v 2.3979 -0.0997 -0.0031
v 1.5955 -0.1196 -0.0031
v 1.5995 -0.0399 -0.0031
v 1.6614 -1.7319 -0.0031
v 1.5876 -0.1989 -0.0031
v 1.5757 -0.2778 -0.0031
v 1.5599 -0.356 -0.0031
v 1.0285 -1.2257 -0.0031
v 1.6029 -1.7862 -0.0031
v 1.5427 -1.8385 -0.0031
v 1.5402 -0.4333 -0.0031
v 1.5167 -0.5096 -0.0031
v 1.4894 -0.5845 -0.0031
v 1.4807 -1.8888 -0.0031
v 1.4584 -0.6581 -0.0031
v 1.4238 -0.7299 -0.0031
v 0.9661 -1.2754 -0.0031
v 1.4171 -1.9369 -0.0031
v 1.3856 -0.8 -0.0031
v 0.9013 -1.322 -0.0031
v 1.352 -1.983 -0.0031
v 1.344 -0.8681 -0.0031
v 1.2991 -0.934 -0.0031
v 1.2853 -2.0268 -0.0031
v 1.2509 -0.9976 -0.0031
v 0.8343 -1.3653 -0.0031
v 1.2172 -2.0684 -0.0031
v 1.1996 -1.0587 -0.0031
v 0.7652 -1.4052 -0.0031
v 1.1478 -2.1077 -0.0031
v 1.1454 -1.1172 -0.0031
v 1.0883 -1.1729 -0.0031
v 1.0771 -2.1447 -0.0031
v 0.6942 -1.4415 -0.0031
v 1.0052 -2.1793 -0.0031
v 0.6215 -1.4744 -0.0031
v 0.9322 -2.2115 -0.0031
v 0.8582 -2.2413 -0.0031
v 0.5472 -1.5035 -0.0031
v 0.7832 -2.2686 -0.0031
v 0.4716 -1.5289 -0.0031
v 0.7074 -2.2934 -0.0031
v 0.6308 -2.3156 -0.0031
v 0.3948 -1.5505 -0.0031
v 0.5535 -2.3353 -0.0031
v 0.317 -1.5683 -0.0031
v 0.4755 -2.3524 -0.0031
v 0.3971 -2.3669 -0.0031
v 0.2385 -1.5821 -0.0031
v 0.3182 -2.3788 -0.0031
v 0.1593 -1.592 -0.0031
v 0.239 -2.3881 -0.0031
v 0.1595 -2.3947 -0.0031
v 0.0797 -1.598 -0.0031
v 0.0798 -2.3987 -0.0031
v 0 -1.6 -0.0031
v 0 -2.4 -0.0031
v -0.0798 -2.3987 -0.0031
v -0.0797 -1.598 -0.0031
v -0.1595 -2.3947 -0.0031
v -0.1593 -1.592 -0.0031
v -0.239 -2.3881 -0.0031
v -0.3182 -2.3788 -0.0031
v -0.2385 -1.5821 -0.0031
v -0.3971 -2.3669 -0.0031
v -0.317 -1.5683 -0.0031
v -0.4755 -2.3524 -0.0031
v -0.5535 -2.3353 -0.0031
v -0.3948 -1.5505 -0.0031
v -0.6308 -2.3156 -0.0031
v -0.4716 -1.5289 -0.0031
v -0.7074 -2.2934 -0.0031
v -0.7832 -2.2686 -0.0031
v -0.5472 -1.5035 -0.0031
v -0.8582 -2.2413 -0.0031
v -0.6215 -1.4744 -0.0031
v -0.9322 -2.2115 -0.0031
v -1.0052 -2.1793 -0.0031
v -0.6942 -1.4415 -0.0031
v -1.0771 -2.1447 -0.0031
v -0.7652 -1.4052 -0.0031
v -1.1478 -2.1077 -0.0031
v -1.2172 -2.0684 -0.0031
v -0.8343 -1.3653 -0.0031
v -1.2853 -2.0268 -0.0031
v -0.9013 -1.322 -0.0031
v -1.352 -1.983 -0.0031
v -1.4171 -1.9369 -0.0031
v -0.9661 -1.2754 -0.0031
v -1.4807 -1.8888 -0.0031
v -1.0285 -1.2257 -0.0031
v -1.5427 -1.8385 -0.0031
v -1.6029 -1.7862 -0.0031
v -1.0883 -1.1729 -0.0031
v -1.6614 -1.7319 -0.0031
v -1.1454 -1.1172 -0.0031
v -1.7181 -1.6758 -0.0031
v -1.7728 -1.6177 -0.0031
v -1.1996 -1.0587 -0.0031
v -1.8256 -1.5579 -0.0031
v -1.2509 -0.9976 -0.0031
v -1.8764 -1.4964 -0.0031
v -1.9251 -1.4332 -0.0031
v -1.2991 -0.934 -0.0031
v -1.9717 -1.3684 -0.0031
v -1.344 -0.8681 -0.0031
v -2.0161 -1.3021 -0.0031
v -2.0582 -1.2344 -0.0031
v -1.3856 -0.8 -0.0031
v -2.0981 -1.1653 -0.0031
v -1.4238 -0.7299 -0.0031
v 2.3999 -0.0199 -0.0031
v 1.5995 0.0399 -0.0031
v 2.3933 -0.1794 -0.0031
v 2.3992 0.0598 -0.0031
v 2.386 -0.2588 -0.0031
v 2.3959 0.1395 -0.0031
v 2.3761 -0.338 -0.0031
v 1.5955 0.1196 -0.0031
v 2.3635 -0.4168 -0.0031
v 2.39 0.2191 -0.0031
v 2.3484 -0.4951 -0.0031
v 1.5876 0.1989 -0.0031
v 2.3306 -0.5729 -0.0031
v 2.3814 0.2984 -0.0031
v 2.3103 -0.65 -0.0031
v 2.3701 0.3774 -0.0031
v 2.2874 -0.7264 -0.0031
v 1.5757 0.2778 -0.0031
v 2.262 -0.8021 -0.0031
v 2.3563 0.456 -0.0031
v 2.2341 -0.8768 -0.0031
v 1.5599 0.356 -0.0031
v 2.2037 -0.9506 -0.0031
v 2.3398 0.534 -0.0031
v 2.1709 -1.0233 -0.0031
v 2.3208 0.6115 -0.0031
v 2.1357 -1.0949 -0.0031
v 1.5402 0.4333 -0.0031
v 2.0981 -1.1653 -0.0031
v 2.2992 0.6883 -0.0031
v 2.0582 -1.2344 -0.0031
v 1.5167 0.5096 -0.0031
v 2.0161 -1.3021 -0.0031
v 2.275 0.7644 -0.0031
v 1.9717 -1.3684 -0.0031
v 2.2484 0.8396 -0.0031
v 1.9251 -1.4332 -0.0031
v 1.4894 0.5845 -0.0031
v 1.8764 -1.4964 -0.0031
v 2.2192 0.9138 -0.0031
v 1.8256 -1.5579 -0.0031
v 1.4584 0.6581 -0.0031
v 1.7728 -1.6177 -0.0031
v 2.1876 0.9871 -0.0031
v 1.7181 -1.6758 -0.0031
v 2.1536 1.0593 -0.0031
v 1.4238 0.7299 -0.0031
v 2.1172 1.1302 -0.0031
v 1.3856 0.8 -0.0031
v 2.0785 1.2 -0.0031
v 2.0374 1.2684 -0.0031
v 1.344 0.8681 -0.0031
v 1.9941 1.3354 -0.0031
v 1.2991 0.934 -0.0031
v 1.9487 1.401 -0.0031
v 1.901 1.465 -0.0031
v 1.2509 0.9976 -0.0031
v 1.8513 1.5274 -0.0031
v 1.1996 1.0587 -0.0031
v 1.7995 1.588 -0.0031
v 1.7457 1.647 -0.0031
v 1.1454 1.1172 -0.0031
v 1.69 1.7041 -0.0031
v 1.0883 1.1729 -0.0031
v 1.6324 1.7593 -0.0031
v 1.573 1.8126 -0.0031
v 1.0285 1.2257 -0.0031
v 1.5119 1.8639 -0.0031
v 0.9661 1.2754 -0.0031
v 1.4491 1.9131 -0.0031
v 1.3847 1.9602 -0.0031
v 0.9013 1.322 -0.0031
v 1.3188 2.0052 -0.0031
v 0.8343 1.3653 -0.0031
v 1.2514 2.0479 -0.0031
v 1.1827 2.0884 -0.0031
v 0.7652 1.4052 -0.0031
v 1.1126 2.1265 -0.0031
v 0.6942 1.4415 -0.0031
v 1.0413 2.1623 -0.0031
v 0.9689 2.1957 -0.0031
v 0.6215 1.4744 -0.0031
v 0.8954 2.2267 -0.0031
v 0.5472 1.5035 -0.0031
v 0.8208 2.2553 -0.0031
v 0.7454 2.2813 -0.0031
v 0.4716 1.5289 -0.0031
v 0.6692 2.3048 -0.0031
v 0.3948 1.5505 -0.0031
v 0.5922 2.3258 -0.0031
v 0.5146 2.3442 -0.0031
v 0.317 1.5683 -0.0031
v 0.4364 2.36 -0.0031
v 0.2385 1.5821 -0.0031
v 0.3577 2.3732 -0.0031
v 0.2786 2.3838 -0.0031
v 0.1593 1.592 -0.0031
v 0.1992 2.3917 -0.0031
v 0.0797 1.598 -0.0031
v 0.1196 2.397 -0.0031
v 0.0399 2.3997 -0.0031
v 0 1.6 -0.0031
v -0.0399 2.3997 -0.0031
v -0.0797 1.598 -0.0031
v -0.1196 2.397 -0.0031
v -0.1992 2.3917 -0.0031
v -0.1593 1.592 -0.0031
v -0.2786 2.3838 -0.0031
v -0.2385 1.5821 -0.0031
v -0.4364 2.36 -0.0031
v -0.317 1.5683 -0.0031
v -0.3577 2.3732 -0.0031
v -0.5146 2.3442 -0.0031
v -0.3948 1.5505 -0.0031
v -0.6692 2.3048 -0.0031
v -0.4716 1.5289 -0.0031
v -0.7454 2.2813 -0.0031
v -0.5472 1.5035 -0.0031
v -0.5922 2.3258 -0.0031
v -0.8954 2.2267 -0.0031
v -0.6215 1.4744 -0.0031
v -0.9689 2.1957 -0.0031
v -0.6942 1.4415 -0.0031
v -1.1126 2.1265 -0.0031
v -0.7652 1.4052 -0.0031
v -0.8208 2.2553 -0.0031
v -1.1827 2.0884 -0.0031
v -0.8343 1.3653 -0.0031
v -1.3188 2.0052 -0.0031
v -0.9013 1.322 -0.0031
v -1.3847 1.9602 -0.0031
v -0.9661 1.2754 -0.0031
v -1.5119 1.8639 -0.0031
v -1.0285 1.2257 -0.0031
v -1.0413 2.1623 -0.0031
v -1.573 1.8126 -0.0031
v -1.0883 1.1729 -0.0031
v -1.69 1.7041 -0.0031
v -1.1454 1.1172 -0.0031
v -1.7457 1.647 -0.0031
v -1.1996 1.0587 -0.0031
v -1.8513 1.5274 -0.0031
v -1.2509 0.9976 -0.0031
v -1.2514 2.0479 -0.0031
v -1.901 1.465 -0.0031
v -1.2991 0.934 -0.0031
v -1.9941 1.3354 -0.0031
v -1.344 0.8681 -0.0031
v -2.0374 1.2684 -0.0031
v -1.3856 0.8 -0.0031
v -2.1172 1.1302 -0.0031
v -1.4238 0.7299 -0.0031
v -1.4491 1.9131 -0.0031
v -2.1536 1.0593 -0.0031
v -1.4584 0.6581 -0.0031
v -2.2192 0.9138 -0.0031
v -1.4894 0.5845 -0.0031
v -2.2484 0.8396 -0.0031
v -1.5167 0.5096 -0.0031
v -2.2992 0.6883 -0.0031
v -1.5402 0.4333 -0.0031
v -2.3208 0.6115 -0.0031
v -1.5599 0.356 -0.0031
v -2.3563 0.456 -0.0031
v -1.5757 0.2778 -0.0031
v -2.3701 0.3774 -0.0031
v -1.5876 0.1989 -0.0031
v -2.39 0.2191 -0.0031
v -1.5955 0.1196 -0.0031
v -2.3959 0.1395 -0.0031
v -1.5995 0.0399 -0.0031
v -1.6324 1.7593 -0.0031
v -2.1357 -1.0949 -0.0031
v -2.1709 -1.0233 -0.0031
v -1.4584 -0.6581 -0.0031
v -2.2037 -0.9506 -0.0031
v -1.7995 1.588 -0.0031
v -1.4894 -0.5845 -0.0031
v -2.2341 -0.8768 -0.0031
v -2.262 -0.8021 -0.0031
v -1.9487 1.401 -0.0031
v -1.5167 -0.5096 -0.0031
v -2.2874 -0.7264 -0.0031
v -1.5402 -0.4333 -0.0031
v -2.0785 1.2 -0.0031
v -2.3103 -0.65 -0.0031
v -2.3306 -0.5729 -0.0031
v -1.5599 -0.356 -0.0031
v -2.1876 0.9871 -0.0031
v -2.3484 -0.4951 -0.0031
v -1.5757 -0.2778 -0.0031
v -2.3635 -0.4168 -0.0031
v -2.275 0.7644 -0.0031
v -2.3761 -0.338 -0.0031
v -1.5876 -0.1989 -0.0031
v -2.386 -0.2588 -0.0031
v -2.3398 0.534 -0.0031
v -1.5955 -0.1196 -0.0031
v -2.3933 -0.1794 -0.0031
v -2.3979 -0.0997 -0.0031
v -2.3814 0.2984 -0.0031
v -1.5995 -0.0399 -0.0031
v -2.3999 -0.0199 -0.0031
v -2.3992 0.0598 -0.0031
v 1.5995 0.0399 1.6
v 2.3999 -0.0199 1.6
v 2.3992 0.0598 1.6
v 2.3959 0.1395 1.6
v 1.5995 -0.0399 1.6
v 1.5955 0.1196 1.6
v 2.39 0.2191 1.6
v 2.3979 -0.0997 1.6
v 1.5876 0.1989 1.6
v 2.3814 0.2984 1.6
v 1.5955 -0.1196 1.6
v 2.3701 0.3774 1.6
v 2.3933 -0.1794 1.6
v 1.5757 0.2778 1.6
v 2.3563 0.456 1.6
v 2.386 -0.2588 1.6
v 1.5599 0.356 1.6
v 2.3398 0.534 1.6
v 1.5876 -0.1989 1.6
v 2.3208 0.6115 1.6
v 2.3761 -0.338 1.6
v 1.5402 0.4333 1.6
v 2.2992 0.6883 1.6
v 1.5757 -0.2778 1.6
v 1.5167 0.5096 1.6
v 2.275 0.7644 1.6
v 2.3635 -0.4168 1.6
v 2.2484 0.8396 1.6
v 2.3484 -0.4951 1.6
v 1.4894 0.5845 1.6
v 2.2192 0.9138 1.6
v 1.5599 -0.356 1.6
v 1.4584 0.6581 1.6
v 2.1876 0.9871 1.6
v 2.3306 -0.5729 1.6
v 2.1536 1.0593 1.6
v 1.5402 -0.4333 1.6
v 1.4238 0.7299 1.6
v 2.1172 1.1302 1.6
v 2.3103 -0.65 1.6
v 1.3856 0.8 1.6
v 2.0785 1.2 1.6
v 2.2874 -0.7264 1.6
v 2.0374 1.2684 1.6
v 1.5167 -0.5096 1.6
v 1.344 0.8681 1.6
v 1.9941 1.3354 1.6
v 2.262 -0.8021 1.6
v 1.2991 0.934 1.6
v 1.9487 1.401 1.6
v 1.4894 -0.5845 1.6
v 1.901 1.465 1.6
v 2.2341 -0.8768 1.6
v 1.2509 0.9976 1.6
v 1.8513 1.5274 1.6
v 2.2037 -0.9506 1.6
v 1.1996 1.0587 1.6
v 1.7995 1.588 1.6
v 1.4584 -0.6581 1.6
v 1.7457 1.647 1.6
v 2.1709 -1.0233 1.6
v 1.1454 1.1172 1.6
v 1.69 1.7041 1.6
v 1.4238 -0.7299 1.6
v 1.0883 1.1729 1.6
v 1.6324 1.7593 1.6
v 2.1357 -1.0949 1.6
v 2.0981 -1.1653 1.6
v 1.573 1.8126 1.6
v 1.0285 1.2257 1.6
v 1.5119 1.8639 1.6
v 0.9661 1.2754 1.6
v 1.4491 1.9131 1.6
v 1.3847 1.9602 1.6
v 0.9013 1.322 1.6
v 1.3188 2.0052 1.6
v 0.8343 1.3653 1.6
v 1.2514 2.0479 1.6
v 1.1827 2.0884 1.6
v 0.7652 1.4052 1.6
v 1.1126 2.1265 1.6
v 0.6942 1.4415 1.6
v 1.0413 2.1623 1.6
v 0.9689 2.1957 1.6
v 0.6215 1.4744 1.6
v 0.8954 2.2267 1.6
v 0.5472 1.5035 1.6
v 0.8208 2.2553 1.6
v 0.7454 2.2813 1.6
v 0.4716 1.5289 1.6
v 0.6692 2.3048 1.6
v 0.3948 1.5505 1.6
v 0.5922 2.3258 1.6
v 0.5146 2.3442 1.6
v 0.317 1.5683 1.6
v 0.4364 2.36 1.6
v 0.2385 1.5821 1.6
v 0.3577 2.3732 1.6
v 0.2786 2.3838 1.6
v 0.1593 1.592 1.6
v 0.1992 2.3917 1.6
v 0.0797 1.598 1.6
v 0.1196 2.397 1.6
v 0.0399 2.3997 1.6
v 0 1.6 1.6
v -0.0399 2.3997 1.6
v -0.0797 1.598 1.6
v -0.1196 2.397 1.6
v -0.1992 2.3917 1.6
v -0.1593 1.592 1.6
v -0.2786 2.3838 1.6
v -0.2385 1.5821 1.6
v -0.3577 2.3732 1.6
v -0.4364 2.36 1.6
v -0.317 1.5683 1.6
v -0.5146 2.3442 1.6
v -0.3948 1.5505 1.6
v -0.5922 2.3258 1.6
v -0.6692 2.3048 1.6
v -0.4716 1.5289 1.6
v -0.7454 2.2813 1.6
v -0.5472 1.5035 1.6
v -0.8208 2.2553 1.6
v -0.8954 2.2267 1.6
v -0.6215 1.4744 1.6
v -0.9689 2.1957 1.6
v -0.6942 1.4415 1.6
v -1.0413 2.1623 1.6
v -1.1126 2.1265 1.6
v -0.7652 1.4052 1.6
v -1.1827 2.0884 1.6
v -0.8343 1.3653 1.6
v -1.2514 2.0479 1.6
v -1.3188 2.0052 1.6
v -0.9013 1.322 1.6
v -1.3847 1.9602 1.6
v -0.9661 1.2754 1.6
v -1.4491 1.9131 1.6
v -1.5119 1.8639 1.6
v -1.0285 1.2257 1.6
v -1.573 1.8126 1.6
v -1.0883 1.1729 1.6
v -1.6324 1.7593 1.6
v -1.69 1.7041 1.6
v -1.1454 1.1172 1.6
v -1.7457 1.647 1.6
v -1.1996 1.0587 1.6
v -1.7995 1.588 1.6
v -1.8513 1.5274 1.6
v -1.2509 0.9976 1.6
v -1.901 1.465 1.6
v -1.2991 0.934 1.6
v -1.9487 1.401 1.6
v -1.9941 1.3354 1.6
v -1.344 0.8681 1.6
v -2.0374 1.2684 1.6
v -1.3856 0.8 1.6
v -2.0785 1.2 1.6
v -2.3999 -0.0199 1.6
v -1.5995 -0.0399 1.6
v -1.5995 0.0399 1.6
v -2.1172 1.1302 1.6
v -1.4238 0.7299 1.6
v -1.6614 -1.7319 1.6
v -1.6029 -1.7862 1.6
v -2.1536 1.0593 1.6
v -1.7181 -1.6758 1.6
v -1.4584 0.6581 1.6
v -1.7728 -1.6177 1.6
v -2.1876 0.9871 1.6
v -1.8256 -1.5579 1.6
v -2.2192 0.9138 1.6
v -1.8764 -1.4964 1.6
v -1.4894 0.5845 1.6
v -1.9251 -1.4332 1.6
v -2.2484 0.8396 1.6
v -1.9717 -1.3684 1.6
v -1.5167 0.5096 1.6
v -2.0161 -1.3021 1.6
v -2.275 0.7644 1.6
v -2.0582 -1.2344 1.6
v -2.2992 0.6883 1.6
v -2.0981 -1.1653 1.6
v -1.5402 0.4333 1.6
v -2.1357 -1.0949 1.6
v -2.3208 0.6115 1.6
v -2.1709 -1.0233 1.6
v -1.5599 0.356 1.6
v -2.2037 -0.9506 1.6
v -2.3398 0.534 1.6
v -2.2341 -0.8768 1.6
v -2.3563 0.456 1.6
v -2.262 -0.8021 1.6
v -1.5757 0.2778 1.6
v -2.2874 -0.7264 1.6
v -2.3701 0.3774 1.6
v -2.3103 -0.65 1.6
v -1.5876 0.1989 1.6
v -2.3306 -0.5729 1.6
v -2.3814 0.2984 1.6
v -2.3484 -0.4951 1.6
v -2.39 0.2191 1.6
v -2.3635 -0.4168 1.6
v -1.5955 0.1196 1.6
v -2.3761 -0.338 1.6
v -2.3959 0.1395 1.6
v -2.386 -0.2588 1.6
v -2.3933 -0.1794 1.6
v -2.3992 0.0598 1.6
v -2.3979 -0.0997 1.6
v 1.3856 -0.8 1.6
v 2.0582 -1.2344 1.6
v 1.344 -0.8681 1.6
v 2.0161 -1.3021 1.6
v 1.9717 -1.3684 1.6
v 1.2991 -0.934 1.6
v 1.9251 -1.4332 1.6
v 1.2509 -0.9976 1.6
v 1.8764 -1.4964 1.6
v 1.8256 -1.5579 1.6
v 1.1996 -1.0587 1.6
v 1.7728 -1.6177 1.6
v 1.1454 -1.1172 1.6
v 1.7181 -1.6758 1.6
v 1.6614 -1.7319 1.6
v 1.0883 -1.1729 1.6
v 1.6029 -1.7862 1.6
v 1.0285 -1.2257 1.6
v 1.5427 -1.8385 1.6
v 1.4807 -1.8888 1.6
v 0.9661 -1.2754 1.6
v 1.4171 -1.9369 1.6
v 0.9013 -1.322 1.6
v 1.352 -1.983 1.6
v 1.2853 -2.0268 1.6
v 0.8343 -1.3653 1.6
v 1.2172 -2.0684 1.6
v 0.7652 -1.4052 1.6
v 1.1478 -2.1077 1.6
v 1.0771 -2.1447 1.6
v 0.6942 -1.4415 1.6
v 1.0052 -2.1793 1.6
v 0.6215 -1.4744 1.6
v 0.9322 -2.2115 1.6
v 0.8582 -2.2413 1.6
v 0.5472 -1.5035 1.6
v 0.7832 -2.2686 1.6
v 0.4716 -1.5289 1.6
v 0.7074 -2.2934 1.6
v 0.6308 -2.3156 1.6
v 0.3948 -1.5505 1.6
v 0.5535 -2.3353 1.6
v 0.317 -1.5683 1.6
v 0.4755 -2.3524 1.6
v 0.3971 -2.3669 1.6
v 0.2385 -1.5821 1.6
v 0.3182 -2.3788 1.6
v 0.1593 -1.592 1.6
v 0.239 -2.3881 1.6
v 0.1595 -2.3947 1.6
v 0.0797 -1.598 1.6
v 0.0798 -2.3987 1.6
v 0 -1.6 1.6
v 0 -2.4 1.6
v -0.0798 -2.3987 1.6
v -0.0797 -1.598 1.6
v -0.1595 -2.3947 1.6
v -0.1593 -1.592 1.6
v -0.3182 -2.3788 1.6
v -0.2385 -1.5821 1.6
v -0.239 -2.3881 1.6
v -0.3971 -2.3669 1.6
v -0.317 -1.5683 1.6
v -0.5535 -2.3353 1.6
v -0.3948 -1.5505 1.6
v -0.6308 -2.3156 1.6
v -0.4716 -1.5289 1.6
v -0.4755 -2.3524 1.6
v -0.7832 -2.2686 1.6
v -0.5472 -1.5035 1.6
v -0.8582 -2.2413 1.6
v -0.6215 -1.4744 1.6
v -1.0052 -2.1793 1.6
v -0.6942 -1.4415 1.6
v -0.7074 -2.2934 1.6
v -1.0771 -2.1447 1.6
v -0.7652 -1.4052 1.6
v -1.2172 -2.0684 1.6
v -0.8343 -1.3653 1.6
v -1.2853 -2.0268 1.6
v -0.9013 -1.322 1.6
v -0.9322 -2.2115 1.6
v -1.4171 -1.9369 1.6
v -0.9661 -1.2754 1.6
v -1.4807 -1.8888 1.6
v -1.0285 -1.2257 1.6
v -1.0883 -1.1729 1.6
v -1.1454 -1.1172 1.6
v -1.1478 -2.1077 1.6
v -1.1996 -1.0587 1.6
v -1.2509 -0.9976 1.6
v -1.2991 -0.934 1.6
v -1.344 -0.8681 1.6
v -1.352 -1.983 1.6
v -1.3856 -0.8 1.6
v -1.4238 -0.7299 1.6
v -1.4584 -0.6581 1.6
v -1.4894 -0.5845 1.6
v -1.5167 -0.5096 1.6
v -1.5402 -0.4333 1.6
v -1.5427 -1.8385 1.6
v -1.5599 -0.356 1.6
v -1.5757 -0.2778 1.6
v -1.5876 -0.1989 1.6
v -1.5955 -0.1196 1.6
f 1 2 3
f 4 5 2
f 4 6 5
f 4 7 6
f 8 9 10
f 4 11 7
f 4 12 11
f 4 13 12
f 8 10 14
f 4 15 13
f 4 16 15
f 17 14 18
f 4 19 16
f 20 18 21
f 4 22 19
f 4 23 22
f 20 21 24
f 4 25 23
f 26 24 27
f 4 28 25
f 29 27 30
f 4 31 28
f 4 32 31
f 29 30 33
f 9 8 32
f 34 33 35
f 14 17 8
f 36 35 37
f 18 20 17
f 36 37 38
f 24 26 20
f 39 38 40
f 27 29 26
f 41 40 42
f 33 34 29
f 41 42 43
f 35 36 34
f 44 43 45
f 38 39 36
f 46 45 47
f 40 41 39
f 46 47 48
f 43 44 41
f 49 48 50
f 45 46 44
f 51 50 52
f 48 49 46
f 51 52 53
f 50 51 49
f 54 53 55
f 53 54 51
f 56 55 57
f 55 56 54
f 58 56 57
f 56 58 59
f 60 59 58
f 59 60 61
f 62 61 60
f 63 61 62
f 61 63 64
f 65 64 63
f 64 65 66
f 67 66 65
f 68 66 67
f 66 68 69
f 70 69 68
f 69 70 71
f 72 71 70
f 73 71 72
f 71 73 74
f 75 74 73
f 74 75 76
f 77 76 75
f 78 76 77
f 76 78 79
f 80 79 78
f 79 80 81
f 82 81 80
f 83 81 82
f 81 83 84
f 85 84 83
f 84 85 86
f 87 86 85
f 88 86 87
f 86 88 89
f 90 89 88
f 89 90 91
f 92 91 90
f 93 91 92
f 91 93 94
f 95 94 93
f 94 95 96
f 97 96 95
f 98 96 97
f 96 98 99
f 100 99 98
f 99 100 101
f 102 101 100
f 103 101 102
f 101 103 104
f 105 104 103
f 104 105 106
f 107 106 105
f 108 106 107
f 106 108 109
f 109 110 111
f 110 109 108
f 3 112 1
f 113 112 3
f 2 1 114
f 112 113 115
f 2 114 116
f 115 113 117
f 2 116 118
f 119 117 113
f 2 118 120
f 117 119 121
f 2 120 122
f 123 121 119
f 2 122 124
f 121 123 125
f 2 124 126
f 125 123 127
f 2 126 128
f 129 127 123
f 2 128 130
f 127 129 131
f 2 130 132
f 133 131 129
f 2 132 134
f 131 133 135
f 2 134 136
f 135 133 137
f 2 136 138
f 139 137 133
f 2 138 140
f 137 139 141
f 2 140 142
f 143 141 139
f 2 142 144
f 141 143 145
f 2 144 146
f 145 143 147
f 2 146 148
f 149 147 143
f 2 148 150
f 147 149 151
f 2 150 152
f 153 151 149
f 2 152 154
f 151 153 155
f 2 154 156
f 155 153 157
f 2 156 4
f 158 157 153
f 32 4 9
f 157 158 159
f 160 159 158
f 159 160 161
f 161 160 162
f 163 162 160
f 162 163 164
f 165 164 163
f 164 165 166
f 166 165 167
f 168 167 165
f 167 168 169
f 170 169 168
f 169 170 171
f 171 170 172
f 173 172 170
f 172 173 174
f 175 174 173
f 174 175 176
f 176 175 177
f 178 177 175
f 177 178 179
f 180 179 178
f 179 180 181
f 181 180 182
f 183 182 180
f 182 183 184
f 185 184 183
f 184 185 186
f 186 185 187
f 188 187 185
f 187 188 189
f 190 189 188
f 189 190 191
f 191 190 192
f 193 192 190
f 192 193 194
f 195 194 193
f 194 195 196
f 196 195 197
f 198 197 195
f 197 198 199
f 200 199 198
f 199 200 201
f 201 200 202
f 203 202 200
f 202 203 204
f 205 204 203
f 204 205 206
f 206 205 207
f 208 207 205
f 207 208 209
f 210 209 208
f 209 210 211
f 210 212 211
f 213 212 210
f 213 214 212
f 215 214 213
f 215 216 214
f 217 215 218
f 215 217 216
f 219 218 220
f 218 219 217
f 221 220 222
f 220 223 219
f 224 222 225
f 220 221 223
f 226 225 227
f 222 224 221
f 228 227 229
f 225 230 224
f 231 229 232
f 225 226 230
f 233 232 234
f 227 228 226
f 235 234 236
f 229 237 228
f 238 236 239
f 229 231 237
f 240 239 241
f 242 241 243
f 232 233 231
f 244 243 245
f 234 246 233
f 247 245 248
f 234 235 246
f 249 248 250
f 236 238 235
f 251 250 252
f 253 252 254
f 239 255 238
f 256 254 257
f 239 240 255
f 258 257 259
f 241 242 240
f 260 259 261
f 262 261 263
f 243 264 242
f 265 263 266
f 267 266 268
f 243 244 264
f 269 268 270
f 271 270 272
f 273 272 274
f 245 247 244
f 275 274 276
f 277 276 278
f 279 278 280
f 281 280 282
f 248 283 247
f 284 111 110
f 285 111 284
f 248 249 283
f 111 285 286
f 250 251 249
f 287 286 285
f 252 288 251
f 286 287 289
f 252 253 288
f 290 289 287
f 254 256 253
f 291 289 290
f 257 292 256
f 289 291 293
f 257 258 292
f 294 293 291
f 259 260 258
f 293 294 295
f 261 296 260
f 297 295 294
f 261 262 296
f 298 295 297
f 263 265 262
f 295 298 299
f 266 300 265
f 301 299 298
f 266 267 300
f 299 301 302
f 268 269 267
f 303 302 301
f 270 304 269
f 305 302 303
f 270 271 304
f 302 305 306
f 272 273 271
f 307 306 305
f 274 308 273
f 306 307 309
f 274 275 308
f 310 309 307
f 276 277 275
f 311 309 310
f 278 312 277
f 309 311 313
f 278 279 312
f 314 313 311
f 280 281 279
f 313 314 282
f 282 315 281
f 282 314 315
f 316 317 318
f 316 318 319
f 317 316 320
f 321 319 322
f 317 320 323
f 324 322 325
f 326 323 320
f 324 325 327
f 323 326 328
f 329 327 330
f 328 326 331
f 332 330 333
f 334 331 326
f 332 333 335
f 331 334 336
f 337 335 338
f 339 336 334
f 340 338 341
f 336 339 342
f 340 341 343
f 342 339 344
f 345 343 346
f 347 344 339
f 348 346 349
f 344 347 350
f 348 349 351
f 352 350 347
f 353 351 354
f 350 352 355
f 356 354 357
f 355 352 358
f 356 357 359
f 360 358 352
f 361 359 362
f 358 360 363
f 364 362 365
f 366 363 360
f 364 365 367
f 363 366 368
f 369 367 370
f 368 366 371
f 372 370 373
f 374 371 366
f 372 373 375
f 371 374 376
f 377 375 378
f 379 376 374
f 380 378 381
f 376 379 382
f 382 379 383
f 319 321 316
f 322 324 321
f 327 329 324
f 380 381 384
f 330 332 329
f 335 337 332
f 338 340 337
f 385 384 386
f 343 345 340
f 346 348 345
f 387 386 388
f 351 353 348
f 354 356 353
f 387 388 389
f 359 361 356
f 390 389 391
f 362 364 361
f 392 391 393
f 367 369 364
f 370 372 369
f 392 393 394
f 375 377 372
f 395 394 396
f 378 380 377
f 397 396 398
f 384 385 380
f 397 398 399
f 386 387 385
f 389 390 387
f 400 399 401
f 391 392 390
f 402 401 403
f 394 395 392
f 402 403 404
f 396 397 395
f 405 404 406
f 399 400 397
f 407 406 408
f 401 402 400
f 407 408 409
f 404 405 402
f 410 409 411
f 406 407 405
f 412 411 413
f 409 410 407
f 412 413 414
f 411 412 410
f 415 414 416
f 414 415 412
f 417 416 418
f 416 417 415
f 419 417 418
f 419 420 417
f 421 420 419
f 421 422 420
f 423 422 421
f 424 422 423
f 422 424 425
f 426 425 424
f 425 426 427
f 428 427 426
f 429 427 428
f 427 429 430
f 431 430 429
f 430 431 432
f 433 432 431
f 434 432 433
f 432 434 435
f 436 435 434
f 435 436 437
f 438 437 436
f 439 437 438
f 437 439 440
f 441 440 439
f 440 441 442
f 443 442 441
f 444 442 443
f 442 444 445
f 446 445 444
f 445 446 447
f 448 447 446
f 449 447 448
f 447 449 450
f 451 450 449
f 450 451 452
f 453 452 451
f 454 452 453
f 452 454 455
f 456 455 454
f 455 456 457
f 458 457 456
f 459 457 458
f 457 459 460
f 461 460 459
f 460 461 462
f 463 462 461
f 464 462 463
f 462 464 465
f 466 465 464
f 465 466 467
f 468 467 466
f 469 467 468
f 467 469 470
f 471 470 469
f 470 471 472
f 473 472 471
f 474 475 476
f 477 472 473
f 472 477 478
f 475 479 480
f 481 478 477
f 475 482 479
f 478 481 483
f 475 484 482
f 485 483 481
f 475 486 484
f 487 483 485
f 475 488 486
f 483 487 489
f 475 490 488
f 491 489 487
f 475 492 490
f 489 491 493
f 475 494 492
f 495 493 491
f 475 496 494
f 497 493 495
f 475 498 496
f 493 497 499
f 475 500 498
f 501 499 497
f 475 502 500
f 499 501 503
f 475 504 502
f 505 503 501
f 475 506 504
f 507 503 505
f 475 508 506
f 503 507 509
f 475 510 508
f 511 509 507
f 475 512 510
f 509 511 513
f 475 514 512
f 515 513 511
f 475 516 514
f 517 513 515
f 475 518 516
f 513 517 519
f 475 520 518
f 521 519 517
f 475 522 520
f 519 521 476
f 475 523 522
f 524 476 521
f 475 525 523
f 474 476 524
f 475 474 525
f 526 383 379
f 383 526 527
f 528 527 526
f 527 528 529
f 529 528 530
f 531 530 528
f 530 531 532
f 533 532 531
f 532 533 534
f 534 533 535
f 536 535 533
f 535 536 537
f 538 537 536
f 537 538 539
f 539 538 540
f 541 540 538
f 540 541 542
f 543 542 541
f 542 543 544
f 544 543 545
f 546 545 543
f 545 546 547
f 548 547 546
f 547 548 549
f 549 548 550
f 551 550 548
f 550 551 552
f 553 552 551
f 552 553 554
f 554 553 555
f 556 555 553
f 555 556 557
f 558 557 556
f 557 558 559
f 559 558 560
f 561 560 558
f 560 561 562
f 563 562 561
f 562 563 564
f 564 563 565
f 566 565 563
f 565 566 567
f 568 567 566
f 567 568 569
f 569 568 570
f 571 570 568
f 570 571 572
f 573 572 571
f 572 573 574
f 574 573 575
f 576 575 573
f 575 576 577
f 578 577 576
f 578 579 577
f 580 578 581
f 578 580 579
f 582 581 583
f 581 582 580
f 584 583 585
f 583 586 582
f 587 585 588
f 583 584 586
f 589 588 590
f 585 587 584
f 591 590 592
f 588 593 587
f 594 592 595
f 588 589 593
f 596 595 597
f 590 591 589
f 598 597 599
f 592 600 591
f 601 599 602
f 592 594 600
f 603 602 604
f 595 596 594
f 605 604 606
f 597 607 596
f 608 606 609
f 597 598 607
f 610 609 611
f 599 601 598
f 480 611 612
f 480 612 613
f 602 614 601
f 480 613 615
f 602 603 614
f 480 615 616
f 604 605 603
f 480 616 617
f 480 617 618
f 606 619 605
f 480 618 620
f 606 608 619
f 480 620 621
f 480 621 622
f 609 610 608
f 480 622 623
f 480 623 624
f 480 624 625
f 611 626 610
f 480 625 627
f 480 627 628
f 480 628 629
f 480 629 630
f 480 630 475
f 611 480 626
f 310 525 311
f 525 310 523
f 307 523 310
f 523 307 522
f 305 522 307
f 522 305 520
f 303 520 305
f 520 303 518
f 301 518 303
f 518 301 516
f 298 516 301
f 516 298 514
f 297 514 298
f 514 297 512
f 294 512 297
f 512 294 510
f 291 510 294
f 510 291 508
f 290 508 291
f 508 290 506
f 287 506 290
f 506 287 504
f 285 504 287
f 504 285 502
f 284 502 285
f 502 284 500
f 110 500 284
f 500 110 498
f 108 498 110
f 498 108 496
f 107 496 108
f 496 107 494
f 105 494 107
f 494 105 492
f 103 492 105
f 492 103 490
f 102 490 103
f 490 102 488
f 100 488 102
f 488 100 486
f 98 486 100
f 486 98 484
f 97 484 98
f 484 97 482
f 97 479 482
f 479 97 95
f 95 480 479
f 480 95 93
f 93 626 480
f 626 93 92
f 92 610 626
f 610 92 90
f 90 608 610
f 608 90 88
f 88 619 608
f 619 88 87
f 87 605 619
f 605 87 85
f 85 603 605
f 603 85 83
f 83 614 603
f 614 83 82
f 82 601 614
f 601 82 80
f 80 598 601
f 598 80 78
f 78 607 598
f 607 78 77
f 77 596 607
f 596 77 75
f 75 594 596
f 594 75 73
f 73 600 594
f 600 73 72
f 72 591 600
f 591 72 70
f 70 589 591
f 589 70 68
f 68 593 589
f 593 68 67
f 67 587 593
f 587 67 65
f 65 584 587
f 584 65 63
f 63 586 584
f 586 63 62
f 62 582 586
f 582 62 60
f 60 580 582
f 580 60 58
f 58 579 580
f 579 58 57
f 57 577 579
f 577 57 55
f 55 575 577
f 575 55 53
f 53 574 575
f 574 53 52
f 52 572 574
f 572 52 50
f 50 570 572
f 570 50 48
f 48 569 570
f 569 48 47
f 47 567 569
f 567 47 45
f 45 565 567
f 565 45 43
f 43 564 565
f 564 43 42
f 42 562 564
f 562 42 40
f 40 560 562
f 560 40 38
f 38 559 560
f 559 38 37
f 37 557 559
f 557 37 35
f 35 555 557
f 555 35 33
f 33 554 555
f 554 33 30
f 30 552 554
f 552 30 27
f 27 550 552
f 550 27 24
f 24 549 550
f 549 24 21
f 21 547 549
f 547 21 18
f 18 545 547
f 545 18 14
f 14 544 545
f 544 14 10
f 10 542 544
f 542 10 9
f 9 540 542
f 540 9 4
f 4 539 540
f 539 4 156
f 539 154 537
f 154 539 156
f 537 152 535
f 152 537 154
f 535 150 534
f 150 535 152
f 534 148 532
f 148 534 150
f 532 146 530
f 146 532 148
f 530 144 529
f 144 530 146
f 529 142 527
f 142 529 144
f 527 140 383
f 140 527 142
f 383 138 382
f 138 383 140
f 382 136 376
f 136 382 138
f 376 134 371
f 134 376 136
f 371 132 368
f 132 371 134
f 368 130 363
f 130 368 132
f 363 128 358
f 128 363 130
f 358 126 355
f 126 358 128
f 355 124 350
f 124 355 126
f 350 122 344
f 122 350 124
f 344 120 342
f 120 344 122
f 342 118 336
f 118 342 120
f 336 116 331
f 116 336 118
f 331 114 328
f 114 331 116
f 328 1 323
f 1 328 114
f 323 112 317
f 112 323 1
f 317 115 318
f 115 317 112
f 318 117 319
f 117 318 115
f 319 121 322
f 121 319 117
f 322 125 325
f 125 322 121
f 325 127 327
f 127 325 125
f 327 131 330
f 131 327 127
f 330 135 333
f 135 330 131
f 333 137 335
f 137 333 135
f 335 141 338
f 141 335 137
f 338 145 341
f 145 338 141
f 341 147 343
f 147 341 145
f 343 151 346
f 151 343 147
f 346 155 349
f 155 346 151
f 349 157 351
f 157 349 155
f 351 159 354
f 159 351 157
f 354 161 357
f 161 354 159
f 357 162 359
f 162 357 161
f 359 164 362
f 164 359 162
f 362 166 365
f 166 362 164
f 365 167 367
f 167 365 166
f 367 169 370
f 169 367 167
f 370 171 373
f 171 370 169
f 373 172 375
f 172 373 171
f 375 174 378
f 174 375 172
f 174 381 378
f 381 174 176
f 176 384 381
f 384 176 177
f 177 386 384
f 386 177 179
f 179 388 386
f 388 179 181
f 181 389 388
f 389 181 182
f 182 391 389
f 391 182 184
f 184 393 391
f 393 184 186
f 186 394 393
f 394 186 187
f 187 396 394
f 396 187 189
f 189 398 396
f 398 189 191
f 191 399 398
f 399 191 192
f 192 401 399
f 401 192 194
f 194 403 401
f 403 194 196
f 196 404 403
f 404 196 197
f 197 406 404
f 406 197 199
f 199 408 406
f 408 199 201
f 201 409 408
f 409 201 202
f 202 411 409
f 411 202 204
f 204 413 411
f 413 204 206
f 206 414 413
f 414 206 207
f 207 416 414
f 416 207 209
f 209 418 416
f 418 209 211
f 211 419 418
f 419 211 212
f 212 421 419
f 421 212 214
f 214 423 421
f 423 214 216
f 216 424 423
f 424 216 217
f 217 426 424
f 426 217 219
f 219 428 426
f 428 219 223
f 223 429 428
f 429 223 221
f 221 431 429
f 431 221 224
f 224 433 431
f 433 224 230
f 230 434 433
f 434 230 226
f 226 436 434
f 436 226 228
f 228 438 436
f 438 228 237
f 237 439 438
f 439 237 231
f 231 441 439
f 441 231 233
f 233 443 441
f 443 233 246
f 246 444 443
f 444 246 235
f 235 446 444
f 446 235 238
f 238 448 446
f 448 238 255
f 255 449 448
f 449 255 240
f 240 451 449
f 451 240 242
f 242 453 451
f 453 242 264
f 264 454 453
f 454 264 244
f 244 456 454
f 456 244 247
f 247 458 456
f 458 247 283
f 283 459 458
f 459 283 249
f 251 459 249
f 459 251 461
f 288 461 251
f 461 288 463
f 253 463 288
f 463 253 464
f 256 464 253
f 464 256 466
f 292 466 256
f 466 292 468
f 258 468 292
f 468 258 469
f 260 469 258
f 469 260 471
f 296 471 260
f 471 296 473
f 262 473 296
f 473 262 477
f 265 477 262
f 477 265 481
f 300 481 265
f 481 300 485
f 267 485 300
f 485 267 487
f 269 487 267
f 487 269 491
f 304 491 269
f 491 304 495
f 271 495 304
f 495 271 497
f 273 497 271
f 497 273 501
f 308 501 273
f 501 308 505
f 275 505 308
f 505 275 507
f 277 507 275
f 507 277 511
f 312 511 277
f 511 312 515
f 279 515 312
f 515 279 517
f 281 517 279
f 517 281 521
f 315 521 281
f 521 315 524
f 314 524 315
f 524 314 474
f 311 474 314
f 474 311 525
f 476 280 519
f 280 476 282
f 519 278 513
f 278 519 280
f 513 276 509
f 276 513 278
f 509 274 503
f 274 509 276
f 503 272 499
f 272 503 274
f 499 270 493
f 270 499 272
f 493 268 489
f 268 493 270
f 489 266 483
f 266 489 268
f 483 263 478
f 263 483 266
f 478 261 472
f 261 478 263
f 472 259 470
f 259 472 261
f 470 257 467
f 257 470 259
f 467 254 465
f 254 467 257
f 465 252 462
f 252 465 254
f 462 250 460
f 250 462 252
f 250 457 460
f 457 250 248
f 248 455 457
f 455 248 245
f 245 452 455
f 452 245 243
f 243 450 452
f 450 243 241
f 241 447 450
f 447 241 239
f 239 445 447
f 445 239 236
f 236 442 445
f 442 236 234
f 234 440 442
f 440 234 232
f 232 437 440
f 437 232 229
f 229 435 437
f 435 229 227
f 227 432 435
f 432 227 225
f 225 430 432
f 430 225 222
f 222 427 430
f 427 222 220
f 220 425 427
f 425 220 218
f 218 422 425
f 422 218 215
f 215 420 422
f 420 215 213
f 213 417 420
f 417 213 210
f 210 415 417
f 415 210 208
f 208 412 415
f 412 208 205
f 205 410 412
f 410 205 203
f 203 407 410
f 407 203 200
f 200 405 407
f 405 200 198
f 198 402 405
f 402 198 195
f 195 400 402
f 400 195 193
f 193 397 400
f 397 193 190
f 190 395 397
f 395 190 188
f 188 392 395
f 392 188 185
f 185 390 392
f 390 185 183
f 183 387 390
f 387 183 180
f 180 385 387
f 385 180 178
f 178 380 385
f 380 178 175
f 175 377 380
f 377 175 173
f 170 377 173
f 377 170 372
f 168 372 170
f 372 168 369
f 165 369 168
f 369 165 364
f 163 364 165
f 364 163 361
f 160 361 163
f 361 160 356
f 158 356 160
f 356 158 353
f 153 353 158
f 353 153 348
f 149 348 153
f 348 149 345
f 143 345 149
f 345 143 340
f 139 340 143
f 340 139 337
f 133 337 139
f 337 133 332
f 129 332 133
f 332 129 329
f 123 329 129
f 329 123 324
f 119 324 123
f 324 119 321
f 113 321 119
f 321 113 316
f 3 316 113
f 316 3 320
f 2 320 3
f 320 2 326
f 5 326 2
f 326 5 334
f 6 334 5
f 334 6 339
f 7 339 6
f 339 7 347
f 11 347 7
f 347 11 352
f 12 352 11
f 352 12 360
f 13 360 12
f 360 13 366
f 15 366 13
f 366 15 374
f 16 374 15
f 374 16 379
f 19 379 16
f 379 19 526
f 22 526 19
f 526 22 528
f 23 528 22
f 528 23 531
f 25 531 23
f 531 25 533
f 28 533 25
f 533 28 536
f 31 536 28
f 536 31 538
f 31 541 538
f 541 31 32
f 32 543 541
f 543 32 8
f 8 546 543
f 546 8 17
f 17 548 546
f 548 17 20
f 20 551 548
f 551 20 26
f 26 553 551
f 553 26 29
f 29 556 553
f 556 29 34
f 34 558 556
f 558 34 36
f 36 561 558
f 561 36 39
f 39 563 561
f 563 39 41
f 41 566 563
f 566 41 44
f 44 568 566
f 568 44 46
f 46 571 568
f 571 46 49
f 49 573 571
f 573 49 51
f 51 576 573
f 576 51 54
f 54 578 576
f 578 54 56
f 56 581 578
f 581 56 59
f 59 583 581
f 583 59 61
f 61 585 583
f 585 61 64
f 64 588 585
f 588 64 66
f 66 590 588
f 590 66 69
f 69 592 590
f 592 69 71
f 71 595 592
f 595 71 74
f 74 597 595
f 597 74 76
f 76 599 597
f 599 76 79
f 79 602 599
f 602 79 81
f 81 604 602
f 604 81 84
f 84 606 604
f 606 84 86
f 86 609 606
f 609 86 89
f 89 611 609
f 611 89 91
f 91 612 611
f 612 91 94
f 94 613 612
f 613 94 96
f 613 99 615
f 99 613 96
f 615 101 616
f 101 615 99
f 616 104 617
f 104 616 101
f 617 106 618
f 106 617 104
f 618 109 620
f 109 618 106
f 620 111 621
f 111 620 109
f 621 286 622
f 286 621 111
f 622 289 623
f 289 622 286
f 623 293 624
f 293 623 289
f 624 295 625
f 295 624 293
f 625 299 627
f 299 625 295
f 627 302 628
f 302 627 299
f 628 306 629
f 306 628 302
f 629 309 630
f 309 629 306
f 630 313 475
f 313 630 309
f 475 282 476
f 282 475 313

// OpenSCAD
use <../lib.scad>
use <s/4181s01.scad>
use <s/4181s02.scad>
use <../p/stud2.scad>
$fa=1; $fs=0.2;
function ldraw_lib__4181p03(realsolid=false) = [
// 0 Train Door  1 x  4 x  5 Left with White Stripe Pattern
// 0 Name: 4181p03.dat
// 0 Author: James Jessiman
// 0 !LDRAW_ORG Part UPDATE 2009-02
// 0 !LICENSE Licensed under CC BY 2.0 and CC BY 4.0 : see CAreadme.txt
// 
// 0 BFC CERTIFY CCW
  [0,"BFC","CERTIFY"],
  [0,"BFC","CCW"],
// 
// 0 !HISTORY 2007-07-04 [PTadmin] Header formatted for Contributor Agreement
// 0 !HISTORY 2008-07-01 [PTadmin] Official Update 2008-01
// 0 !HISTORY 2008-07-07 [WilliamH] BFCed; sub-parted (2006-09-12)
// 0 !HISTORY 2009-09-03 [PTadmin] Official Update 2009-02
// 
// 
// 1 16 0 0 0 1 0 0 0 1 0 0 0 1 stud2.dat
  [1,16,0,0,0,1,0,0,0,1,0,0,0,1, ldraw_lib__stud2(realsolid)],
// 1 16 0 0 0 1 0 0 0 1 0 0 0 1 s\4181s01.dat
  [1,16,0,0,0,1,0,0,0,1,0,0,0,1, ldraw_lib__s__4181s01(realsolid)],
// 1 15 0 72 0 1 0 0 0 3 0 0 0 1 s\4181s02.dat
  [1,15,0,72,0,1,0,0,0,3,0,0,0,1, ldraw_lib__s__4181s02(realsolid)],
// 1 16 0 96 0 1 0 0 0 3 0 0 0 1 s\4181s02.dat
  [1,16,0,96,0,1,0,0,0,3,0,0,0,1, ldraw_lib__s__4181s02(realsolid)],
// 0
];
module ldraw_lib__4181p03(step=0, col=false, unit=2/5, alt=false, line=0.2, solid=!$preview)
    makepoly(ldraw_lib__4181p03(solid), step=step, col=col, unit=unit, alt=alt, line=line, solid=solid);
ldraw_lib__4181p03(line=0.2);
